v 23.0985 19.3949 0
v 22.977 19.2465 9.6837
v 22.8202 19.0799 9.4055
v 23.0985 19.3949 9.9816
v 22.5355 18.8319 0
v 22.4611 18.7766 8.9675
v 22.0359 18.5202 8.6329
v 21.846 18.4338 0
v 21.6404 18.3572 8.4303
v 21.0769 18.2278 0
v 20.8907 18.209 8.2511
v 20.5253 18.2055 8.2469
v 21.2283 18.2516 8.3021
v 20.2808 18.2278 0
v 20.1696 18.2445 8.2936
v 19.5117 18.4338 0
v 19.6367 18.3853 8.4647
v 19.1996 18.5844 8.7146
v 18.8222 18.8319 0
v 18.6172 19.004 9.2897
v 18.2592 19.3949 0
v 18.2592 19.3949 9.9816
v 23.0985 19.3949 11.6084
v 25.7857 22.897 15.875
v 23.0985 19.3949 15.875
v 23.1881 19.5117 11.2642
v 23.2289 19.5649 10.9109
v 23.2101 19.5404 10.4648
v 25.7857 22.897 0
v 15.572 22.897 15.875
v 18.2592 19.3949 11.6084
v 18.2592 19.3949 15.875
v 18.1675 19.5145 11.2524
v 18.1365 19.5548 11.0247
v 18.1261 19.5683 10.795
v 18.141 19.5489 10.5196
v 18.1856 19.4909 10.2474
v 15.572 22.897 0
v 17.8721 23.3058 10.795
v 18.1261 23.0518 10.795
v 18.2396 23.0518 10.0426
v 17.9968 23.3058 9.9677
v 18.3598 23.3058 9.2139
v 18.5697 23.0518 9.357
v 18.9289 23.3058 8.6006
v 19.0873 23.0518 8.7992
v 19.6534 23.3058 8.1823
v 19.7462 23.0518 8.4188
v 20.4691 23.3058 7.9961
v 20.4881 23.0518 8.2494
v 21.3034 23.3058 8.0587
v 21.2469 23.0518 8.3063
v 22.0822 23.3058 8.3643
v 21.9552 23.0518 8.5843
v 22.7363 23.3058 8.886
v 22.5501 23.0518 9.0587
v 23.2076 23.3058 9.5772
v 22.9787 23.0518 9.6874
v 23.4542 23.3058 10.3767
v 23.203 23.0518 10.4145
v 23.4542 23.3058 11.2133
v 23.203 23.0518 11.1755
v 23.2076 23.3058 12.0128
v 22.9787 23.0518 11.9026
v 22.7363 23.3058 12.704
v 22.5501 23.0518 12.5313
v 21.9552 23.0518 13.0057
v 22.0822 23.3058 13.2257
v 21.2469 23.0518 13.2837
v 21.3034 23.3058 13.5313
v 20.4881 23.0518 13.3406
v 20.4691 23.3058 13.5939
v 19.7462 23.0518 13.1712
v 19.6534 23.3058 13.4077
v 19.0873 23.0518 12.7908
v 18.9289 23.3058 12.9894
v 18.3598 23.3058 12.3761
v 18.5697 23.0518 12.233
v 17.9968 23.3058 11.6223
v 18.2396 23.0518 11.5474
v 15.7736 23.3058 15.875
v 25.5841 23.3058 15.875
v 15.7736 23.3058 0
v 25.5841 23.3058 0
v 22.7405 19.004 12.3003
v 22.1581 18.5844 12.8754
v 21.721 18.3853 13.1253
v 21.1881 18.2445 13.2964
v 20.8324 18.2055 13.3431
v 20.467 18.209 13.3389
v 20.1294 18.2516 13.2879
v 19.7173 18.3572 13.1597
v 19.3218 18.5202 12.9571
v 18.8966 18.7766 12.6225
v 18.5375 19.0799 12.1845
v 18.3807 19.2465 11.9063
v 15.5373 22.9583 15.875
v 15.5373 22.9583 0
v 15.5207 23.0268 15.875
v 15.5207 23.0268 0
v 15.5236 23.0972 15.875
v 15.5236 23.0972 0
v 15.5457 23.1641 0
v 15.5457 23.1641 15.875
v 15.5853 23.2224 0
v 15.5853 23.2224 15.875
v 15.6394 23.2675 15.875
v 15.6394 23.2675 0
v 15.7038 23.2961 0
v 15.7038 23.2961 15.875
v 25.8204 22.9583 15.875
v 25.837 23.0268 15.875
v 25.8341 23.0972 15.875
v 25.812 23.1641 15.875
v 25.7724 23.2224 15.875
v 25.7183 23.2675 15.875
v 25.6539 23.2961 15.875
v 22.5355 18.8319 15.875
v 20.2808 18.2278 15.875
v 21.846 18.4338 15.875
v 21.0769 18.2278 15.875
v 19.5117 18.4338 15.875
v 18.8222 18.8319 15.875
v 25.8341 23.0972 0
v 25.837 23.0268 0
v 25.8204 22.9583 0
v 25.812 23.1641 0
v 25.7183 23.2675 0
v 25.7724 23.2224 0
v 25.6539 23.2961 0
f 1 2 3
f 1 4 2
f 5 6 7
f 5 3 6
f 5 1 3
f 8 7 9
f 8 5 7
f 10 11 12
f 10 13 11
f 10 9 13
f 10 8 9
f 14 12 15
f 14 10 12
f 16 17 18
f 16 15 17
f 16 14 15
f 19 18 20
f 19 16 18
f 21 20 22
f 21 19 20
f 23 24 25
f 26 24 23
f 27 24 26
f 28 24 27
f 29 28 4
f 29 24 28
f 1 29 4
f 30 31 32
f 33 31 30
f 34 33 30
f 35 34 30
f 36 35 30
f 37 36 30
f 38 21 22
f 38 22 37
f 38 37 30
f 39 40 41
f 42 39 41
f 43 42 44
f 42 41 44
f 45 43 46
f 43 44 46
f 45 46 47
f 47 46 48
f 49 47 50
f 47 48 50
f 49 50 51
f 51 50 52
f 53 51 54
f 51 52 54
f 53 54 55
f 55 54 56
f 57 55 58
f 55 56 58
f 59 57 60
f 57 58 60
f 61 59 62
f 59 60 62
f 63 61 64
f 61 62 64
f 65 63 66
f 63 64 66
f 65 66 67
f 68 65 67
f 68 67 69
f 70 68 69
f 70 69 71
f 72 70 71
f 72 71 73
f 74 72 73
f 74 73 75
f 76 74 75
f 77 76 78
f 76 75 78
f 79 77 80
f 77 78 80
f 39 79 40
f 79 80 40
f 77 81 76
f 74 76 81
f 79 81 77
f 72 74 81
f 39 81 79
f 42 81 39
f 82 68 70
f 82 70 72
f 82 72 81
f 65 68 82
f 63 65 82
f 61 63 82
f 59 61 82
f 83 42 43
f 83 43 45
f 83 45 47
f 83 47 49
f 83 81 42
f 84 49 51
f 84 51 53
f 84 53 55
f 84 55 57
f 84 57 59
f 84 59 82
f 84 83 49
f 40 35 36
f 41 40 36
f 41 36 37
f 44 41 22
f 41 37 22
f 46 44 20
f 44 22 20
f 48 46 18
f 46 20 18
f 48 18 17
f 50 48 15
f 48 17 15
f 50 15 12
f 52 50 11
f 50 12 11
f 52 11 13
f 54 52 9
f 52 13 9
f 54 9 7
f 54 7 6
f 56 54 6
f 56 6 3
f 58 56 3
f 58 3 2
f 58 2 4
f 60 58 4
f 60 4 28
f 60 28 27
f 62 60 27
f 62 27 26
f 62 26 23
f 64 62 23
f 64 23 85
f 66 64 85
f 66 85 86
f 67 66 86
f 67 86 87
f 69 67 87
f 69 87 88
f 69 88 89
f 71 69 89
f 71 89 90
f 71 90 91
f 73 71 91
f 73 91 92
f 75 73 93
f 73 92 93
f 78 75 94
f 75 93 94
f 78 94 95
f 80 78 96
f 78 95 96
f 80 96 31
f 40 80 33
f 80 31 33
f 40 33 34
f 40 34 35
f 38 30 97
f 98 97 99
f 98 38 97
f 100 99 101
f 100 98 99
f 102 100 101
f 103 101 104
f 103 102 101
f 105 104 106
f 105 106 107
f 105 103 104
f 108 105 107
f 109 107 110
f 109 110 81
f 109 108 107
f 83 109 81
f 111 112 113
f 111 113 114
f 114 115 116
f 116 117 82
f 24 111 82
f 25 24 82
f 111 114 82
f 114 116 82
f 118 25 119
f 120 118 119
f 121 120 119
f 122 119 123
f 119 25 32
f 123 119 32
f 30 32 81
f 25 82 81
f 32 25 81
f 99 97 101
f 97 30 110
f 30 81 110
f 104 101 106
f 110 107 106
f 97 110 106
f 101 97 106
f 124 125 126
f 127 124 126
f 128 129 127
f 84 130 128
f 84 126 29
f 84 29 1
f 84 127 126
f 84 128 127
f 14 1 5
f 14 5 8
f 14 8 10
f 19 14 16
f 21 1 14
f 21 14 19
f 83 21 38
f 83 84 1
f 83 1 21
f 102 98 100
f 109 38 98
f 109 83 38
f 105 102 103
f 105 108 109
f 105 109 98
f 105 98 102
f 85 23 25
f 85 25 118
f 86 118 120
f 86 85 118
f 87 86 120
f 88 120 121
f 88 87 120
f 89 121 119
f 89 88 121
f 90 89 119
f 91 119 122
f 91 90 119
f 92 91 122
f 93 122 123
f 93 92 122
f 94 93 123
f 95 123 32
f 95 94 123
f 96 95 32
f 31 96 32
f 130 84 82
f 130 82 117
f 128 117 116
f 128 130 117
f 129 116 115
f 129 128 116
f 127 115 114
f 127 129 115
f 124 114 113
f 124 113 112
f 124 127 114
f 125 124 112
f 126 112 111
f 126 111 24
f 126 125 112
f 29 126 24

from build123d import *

# Parameters (mm, degrees)
BOSS_EXTRUDE1_DEPTH         = 15.875
TAP_DRILL_FOR_1_4_20_TAP1_D = 5.1054
CHAMFER1_SIZE               = 0.254


with BuildPart() as part:
    # Model → Boss-Extrude1 (new body)
    with BuildSketch(Plane.XY):
        with BuildLine():
            Line((15.773627649, 23.305847831), (25.584064841, 23.305847831))
            ThreePointArc((25.584064841, 23.305847831), (25.812010792, 23.16410193), (25.785700673, 22.896970812))
            Line((25.785700673, 22.896970812), (23.09847623, 19.394911734))
            ThreePointArc((23.09847623, 19.394911734), (20.678846245, 18.201682274), (18.25921626, 19.394911734))
            Line((18.25921626, 19.394911734), (15.571991817, 22.896970812))
            ThreePointArc((15.571991817, 22.896970812), (15.545681698, 23.16410193), (15.773627649, 23.305847831))
        make_face()
    extrude(amount=BOSS_EXTRUDE1_DEPTH)

    # Tap Drill for 1/4-20 Tap1 (through all)
    with Locations(Plane(origin=(0, 23.305847831, 0), x_dir=(1, 0, 0), z_dir=(0, 1, 0))):
        with Locations((20.678846245, -10.795)):
            Hole(TAP_DRILL_FOR_1_4_20_TAP1_D / 2)

    # Chamfer1
    chamfer1_edges = [part.edges().sort_by_distance(p)[0] for p in [
        (23.231546245, 23.305847831, 10.795),
    ]]
    chamfer(chamfer1_edges, length=CHAMFER1_SIZE)


solid = part.part
